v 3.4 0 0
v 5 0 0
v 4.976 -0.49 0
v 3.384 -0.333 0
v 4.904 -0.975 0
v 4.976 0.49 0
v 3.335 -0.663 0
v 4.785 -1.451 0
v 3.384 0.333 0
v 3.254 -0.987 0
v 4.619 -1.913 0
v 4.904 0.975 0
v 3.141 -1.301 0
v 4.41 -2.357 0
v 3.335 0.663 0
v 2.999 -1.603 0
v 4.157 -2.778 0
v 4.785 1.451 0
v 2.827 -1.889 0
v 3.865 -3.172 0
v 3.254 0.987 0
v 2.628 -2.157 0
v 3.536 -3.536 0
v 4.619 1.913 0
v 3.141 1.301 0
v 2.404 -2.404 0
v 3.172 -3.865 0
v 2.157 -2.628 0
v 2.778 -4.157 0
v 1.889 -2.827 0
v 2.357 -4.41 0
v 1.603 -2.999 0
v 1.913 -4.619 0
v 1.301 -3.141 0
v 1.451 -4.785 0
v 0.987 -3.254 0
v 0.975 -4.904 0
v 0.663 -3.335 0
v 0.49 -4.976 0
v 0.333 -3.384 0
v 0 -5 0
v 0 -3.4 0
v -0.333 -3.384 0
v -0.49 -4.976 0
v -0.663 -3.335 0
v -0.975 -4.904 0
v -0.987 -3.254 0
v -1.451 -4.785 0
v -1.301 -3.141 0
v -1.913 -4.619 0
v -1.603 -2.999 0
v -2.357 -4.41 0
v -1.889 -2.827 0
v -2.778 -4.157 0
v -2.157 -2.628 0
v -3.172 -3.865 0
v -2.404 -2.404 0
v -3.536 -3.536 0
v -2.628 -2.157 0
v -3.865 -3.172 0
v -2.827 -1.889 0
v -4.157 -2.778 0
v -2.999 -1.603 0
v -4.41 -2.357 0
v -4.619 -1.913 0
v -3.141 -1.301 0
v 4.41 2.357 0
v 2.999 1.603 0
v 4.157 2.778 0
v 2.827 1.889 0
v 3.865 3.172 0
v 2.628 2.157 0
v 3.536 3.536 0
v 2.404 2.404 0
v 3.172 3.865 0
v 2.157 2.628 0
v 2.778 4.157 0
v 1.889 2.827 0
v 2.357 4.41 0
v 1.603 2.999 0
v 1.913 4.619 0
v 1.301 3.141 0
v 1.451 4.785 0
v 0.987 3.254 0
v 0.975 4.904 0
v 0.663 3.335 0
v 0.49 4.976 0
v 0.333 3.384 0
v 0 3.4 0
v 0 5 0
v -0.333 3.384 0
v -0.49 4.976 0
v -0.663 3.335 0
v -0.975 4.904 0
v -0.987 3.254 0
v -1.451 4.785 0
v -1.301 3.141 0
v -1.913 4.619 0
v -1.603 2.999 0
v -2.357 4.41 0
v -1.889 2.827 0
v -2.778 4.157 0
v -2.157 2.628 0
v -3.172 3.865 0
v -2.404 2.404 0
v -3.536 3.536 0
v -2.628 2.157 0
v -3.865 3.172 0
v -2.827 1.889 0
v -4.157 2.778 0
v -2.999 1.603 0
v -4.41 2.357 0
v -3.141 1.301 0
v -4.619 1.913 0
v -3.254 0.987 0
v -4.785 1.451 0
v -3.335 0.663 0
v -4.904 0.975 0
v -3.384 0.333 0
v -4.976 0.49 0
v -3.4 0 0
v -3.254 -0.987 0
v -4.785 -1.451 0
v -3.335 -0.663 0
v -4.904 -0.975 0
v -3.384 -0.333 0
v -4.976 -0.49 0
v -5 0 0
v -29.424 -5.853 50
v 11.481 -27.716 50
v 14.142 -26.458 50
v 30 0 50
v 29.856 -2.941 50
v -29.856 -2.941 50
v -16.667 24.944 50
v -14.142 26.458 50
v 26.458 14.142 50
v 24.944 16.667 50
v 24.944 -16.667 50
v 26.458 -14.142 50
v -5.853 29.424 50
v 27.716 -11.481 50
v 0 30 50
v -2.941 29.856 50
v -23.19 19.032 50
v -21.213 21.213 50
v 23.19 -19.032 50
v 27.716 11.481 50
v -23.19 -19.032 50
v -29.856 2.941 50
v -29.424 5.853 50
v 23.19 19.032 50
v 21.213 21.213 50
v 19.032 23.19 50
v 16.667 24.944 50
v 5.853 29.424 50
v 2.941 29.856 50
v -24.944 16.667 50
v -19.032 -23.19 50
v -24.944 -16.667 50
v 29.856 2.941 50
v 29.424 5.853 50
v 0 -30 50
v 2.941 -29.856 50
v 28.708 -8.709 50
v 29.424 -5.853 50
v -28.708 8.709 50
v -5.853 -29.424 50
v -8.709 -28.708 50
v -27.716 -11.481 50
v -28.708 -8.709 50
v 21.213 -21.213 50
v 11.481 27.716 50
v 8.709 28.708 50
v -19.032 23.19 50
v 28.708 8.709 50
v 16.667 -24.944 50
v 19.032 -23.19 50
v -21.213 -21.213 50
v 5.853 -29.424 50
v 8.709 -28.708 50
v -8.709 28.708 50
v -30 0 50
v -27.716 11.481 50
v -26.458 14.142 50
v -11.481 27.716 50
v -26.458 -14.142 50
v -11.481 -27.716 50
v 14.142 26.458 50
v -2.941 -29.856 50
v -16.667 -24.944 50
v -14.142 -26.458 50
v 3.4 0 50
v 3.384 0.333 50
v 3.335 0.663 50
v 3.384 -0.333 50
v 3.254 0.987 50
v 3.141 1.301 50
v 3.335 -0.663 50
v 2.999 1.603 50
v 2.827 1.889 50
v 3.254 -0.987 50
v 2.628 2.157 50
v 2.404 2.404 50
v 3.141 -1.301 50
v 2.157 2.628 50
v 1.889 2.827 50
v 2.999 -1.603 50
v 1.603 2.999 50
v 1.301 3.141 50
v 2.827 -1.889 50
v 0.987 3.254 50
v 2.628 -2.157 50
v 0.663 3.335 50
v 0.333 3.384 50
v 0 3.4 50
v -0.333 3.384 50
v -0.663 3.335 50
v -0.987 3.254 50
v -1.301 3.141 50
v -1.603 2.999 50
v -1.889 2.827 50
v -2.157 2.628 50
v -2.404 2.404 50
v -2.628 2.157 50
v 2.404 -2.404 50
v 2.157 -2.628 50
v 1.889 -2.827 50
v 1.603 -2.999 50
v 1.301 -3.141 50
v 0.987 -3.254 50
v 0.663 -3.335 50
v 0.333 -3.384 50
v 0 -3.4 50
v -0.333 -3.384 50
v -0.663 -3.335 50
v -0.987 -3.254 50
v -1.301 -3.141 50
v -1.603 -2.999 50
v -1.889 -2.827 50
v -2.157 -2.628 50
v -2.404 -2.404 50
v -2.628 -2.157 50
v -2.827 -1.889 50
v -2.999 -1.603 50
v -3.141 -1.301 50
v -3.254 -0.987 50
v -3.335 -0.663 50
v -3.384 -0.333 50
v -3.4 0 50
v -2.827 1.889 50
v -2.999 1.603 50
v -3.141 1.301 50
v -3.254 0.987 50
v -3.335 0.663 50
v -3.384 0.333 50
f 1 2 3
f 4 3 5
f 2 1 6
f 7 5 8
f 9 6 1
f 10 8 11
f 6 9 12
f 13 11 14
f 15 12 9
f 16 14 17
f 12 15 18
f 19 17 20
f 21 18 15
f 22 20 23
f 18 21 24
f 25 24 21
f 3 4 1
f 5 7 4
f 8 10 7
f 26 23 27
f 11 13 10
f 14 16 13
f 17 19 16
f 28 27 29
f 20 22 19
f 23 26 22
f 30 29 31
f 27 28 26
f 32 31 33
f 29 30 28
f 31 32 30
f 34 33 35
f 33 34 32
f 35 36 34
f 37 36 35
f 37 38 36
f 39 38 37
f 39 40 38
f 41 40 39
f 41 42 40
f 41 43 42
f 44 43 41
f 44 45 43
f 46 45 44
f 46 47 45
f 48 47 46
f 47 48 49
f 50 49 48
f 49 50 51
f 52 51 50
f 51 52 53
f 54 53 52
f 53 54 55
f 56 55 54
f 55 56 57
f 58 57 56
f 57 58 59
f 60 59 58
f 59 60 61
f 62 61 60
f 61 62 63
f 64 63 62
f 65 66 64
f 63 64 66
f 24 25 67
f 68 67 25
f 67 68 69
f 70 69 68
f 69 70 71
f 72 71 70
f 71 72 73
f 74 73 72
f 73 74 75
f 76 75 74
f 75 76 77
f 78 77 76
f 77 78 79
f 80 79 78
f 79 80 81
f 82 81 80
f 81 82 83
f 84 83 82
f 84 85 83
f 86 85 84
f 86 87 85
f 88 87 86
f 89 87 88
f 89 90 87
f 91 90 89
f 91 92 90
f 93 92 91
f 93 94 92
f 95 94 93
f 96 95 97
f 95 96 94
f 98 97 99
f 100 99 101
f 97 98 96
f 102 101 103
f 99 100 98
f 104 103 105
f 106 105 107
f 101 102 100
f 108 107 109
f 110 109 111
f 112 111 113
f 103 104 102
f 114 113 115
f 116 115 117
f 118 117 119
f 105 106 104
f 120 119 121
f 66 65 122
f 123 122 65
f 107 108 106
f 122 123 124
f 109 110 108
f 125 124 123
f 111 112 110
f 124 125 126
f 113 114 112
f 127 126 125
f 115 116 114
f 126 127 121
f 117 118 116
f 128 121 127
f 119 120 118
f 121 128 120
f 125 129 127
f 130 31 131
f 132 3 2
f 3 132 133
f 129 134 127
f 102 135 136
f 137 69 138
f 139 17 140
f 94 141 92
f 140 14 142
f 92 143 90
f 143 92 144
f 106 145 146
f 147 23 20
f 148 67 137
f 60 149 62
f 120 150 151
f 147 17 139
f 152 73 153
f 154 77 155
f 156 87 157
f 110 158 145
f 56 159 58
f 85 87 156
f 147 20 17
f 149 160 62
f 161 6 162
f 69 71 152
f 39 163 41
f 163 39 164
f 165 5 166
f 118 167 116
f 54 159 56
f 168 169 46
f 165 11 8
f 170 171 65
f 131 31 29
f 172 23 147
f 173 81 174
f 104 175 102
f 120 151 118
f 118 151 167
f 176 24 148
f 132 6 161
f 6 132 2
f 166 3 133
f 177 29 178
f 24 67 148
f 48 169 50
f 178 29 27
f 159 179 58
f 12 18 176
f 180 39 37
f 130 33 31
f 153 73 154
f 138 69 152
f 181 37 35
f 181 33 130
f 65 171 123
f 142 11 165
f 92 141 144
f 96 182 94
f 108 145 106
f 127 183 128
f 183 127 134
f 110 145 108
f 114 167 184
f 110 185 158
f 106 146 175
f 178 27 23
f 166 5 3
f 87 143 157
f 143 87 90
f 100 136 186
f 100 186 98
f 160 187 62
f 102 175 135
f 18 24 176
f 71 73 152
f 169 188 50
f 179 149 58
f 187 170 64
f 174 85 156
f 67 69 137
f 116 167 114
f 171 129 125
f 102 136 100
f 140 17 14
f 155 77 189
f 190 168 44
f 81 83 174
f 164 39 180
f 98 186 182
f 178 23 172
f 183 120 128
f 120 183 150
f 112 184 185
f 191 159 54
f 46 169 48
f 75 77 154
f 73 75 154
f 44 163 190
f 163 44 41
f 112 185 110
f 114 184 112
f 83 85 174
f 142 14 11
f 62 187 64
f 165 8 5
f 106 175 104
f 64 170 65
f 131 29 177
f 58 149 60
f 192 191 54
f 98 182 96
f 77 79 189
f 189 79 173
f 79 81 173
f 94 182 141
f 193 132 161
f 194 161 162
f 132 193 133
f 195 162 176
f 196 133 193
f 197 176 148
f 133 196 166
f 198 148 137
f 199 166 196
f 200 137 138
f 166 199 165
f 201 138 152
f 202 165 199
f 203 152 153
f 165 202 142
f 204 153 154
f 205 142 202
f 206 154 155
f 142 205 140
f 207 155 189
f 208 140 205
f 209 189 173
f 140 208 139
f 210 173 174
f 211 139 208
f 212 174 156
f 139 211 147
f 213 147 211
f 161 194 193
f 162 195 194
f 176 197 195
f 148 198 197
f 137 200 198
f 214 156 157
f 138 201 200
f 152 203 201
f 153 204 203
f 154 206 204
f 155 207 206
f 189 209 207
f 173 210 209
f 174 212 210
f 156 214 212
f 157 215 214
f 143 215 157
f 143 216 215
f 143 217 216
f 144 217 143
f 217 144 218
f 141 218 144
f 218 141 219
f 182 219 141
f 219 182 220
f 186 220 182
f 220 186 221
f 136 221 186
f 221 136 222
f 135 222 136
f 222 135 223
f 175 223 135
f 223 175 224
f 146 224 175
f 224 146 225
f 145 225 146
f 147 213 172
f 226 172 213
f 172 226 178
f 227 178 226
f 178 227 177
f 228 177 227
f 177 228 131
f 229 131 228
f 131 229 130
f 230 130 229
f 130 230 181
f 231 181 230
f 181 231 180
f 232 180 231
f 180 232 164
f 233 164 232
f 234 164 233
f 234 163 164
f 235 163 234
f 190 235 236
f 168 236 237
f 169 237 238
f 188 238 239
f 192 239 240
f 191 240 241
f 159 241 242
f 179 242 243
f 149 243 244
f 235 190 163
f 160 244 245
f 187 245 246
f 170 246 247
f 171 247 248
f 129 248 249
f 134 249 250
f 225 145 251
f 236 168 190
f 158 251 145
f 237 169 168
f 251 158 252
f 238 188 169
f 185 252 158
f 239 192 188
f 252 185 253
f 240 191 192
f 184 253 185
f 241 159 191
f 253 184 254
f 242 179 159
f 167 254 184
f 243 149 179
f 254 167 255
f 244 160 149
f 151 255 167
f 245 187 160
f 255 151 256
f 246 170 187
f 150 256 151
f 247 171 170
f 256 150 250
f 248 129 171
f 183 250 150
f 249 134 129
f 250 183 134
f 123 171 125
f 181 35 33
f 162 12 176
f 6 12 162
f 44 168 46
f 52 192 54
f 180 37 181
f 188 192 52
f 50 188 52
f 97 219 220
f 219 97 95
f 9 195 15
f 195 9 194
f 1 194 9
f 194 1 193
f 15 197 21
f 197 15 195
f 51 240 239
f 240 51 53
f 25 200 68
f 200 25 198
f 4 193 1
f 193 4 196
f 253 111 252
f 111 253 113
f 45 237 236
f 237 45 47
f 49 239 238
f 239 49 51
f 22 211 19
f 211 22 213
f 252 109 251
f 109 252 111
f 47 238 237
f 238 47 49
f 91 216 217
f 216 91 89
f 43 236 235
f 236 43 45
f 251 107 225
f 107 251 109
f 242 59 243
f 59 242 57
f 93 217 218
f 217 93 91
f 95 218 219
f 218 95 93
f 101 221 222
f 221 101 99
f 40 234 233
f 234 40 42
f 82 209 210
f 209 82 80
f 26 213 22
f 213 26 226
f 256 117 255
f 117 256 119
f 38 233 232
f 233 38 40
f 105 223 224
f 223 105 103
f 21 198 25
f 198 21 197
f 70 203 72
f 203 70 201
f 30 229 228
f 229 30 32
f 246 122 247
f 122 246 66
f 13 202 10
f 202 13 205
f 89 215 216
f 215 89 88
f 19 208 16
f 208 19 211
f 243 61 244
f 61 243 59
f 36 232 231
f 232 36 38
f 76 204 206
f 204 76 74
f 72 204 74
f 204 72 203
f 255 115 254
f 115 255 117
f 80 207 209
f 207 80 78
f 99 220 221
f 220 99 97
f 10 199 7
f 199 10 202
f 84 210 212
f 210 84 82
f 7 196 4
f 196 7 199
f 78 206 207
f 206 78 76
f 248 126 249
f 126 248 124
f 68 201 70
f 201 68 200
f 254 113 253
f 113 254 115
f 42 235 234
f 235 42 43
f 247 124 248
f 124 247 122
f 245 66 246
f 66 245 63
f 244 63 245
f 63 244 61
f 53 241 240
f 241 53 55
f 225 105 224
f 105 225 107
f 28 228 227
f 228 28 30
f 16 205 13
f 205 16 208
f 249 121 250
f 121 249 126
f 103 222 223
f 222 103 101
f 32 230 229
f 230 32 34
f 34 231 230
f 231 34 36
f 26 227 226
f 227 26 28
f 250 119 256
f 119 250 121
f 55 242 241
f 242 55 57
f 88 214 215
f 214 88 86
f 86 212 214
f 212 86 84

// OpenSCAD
// Funnel with spout - printed upright, wide opening at top
// Units: mm. Wall thickness 1.6 mm throughout.

$fn = 64;

// ---- Spout ----
spout_od     = 10;    // spout outer diameter
spout_bore   = spout_od - 2 * 1.6;  // bore = 6.8 mm
spout_len    = 20;    // spout length (z = 0 to 20)

// ---- Cone ----
cone_top_d   = 60;    // rim outer diameter at top
cone_bottom_d = spout_od;  // cone starts at spout diameter (z = 20)
cone_h       = cone_top_d - cone_bottom_d;  // cone height = 40 (z = 20 to 50)

// ---- Misc ----
eps          = 0.5;   // cutter overshoot past faces

// Combine spout and cone in one hull, then cut the bore through the full length
difference() {
    union() {
        cylinder(h = spout_len, d = spout_od);                 // spout body
        cylinder(h = cone_h, d1 = spout_od, d2 = cone_top_d);  // cone (no floor)
    }
    translate([0, 0, -eps])
        cylinder(h = spout_len + cone_h + 2 * eps, d = spout_bore);  // through-bore
}
